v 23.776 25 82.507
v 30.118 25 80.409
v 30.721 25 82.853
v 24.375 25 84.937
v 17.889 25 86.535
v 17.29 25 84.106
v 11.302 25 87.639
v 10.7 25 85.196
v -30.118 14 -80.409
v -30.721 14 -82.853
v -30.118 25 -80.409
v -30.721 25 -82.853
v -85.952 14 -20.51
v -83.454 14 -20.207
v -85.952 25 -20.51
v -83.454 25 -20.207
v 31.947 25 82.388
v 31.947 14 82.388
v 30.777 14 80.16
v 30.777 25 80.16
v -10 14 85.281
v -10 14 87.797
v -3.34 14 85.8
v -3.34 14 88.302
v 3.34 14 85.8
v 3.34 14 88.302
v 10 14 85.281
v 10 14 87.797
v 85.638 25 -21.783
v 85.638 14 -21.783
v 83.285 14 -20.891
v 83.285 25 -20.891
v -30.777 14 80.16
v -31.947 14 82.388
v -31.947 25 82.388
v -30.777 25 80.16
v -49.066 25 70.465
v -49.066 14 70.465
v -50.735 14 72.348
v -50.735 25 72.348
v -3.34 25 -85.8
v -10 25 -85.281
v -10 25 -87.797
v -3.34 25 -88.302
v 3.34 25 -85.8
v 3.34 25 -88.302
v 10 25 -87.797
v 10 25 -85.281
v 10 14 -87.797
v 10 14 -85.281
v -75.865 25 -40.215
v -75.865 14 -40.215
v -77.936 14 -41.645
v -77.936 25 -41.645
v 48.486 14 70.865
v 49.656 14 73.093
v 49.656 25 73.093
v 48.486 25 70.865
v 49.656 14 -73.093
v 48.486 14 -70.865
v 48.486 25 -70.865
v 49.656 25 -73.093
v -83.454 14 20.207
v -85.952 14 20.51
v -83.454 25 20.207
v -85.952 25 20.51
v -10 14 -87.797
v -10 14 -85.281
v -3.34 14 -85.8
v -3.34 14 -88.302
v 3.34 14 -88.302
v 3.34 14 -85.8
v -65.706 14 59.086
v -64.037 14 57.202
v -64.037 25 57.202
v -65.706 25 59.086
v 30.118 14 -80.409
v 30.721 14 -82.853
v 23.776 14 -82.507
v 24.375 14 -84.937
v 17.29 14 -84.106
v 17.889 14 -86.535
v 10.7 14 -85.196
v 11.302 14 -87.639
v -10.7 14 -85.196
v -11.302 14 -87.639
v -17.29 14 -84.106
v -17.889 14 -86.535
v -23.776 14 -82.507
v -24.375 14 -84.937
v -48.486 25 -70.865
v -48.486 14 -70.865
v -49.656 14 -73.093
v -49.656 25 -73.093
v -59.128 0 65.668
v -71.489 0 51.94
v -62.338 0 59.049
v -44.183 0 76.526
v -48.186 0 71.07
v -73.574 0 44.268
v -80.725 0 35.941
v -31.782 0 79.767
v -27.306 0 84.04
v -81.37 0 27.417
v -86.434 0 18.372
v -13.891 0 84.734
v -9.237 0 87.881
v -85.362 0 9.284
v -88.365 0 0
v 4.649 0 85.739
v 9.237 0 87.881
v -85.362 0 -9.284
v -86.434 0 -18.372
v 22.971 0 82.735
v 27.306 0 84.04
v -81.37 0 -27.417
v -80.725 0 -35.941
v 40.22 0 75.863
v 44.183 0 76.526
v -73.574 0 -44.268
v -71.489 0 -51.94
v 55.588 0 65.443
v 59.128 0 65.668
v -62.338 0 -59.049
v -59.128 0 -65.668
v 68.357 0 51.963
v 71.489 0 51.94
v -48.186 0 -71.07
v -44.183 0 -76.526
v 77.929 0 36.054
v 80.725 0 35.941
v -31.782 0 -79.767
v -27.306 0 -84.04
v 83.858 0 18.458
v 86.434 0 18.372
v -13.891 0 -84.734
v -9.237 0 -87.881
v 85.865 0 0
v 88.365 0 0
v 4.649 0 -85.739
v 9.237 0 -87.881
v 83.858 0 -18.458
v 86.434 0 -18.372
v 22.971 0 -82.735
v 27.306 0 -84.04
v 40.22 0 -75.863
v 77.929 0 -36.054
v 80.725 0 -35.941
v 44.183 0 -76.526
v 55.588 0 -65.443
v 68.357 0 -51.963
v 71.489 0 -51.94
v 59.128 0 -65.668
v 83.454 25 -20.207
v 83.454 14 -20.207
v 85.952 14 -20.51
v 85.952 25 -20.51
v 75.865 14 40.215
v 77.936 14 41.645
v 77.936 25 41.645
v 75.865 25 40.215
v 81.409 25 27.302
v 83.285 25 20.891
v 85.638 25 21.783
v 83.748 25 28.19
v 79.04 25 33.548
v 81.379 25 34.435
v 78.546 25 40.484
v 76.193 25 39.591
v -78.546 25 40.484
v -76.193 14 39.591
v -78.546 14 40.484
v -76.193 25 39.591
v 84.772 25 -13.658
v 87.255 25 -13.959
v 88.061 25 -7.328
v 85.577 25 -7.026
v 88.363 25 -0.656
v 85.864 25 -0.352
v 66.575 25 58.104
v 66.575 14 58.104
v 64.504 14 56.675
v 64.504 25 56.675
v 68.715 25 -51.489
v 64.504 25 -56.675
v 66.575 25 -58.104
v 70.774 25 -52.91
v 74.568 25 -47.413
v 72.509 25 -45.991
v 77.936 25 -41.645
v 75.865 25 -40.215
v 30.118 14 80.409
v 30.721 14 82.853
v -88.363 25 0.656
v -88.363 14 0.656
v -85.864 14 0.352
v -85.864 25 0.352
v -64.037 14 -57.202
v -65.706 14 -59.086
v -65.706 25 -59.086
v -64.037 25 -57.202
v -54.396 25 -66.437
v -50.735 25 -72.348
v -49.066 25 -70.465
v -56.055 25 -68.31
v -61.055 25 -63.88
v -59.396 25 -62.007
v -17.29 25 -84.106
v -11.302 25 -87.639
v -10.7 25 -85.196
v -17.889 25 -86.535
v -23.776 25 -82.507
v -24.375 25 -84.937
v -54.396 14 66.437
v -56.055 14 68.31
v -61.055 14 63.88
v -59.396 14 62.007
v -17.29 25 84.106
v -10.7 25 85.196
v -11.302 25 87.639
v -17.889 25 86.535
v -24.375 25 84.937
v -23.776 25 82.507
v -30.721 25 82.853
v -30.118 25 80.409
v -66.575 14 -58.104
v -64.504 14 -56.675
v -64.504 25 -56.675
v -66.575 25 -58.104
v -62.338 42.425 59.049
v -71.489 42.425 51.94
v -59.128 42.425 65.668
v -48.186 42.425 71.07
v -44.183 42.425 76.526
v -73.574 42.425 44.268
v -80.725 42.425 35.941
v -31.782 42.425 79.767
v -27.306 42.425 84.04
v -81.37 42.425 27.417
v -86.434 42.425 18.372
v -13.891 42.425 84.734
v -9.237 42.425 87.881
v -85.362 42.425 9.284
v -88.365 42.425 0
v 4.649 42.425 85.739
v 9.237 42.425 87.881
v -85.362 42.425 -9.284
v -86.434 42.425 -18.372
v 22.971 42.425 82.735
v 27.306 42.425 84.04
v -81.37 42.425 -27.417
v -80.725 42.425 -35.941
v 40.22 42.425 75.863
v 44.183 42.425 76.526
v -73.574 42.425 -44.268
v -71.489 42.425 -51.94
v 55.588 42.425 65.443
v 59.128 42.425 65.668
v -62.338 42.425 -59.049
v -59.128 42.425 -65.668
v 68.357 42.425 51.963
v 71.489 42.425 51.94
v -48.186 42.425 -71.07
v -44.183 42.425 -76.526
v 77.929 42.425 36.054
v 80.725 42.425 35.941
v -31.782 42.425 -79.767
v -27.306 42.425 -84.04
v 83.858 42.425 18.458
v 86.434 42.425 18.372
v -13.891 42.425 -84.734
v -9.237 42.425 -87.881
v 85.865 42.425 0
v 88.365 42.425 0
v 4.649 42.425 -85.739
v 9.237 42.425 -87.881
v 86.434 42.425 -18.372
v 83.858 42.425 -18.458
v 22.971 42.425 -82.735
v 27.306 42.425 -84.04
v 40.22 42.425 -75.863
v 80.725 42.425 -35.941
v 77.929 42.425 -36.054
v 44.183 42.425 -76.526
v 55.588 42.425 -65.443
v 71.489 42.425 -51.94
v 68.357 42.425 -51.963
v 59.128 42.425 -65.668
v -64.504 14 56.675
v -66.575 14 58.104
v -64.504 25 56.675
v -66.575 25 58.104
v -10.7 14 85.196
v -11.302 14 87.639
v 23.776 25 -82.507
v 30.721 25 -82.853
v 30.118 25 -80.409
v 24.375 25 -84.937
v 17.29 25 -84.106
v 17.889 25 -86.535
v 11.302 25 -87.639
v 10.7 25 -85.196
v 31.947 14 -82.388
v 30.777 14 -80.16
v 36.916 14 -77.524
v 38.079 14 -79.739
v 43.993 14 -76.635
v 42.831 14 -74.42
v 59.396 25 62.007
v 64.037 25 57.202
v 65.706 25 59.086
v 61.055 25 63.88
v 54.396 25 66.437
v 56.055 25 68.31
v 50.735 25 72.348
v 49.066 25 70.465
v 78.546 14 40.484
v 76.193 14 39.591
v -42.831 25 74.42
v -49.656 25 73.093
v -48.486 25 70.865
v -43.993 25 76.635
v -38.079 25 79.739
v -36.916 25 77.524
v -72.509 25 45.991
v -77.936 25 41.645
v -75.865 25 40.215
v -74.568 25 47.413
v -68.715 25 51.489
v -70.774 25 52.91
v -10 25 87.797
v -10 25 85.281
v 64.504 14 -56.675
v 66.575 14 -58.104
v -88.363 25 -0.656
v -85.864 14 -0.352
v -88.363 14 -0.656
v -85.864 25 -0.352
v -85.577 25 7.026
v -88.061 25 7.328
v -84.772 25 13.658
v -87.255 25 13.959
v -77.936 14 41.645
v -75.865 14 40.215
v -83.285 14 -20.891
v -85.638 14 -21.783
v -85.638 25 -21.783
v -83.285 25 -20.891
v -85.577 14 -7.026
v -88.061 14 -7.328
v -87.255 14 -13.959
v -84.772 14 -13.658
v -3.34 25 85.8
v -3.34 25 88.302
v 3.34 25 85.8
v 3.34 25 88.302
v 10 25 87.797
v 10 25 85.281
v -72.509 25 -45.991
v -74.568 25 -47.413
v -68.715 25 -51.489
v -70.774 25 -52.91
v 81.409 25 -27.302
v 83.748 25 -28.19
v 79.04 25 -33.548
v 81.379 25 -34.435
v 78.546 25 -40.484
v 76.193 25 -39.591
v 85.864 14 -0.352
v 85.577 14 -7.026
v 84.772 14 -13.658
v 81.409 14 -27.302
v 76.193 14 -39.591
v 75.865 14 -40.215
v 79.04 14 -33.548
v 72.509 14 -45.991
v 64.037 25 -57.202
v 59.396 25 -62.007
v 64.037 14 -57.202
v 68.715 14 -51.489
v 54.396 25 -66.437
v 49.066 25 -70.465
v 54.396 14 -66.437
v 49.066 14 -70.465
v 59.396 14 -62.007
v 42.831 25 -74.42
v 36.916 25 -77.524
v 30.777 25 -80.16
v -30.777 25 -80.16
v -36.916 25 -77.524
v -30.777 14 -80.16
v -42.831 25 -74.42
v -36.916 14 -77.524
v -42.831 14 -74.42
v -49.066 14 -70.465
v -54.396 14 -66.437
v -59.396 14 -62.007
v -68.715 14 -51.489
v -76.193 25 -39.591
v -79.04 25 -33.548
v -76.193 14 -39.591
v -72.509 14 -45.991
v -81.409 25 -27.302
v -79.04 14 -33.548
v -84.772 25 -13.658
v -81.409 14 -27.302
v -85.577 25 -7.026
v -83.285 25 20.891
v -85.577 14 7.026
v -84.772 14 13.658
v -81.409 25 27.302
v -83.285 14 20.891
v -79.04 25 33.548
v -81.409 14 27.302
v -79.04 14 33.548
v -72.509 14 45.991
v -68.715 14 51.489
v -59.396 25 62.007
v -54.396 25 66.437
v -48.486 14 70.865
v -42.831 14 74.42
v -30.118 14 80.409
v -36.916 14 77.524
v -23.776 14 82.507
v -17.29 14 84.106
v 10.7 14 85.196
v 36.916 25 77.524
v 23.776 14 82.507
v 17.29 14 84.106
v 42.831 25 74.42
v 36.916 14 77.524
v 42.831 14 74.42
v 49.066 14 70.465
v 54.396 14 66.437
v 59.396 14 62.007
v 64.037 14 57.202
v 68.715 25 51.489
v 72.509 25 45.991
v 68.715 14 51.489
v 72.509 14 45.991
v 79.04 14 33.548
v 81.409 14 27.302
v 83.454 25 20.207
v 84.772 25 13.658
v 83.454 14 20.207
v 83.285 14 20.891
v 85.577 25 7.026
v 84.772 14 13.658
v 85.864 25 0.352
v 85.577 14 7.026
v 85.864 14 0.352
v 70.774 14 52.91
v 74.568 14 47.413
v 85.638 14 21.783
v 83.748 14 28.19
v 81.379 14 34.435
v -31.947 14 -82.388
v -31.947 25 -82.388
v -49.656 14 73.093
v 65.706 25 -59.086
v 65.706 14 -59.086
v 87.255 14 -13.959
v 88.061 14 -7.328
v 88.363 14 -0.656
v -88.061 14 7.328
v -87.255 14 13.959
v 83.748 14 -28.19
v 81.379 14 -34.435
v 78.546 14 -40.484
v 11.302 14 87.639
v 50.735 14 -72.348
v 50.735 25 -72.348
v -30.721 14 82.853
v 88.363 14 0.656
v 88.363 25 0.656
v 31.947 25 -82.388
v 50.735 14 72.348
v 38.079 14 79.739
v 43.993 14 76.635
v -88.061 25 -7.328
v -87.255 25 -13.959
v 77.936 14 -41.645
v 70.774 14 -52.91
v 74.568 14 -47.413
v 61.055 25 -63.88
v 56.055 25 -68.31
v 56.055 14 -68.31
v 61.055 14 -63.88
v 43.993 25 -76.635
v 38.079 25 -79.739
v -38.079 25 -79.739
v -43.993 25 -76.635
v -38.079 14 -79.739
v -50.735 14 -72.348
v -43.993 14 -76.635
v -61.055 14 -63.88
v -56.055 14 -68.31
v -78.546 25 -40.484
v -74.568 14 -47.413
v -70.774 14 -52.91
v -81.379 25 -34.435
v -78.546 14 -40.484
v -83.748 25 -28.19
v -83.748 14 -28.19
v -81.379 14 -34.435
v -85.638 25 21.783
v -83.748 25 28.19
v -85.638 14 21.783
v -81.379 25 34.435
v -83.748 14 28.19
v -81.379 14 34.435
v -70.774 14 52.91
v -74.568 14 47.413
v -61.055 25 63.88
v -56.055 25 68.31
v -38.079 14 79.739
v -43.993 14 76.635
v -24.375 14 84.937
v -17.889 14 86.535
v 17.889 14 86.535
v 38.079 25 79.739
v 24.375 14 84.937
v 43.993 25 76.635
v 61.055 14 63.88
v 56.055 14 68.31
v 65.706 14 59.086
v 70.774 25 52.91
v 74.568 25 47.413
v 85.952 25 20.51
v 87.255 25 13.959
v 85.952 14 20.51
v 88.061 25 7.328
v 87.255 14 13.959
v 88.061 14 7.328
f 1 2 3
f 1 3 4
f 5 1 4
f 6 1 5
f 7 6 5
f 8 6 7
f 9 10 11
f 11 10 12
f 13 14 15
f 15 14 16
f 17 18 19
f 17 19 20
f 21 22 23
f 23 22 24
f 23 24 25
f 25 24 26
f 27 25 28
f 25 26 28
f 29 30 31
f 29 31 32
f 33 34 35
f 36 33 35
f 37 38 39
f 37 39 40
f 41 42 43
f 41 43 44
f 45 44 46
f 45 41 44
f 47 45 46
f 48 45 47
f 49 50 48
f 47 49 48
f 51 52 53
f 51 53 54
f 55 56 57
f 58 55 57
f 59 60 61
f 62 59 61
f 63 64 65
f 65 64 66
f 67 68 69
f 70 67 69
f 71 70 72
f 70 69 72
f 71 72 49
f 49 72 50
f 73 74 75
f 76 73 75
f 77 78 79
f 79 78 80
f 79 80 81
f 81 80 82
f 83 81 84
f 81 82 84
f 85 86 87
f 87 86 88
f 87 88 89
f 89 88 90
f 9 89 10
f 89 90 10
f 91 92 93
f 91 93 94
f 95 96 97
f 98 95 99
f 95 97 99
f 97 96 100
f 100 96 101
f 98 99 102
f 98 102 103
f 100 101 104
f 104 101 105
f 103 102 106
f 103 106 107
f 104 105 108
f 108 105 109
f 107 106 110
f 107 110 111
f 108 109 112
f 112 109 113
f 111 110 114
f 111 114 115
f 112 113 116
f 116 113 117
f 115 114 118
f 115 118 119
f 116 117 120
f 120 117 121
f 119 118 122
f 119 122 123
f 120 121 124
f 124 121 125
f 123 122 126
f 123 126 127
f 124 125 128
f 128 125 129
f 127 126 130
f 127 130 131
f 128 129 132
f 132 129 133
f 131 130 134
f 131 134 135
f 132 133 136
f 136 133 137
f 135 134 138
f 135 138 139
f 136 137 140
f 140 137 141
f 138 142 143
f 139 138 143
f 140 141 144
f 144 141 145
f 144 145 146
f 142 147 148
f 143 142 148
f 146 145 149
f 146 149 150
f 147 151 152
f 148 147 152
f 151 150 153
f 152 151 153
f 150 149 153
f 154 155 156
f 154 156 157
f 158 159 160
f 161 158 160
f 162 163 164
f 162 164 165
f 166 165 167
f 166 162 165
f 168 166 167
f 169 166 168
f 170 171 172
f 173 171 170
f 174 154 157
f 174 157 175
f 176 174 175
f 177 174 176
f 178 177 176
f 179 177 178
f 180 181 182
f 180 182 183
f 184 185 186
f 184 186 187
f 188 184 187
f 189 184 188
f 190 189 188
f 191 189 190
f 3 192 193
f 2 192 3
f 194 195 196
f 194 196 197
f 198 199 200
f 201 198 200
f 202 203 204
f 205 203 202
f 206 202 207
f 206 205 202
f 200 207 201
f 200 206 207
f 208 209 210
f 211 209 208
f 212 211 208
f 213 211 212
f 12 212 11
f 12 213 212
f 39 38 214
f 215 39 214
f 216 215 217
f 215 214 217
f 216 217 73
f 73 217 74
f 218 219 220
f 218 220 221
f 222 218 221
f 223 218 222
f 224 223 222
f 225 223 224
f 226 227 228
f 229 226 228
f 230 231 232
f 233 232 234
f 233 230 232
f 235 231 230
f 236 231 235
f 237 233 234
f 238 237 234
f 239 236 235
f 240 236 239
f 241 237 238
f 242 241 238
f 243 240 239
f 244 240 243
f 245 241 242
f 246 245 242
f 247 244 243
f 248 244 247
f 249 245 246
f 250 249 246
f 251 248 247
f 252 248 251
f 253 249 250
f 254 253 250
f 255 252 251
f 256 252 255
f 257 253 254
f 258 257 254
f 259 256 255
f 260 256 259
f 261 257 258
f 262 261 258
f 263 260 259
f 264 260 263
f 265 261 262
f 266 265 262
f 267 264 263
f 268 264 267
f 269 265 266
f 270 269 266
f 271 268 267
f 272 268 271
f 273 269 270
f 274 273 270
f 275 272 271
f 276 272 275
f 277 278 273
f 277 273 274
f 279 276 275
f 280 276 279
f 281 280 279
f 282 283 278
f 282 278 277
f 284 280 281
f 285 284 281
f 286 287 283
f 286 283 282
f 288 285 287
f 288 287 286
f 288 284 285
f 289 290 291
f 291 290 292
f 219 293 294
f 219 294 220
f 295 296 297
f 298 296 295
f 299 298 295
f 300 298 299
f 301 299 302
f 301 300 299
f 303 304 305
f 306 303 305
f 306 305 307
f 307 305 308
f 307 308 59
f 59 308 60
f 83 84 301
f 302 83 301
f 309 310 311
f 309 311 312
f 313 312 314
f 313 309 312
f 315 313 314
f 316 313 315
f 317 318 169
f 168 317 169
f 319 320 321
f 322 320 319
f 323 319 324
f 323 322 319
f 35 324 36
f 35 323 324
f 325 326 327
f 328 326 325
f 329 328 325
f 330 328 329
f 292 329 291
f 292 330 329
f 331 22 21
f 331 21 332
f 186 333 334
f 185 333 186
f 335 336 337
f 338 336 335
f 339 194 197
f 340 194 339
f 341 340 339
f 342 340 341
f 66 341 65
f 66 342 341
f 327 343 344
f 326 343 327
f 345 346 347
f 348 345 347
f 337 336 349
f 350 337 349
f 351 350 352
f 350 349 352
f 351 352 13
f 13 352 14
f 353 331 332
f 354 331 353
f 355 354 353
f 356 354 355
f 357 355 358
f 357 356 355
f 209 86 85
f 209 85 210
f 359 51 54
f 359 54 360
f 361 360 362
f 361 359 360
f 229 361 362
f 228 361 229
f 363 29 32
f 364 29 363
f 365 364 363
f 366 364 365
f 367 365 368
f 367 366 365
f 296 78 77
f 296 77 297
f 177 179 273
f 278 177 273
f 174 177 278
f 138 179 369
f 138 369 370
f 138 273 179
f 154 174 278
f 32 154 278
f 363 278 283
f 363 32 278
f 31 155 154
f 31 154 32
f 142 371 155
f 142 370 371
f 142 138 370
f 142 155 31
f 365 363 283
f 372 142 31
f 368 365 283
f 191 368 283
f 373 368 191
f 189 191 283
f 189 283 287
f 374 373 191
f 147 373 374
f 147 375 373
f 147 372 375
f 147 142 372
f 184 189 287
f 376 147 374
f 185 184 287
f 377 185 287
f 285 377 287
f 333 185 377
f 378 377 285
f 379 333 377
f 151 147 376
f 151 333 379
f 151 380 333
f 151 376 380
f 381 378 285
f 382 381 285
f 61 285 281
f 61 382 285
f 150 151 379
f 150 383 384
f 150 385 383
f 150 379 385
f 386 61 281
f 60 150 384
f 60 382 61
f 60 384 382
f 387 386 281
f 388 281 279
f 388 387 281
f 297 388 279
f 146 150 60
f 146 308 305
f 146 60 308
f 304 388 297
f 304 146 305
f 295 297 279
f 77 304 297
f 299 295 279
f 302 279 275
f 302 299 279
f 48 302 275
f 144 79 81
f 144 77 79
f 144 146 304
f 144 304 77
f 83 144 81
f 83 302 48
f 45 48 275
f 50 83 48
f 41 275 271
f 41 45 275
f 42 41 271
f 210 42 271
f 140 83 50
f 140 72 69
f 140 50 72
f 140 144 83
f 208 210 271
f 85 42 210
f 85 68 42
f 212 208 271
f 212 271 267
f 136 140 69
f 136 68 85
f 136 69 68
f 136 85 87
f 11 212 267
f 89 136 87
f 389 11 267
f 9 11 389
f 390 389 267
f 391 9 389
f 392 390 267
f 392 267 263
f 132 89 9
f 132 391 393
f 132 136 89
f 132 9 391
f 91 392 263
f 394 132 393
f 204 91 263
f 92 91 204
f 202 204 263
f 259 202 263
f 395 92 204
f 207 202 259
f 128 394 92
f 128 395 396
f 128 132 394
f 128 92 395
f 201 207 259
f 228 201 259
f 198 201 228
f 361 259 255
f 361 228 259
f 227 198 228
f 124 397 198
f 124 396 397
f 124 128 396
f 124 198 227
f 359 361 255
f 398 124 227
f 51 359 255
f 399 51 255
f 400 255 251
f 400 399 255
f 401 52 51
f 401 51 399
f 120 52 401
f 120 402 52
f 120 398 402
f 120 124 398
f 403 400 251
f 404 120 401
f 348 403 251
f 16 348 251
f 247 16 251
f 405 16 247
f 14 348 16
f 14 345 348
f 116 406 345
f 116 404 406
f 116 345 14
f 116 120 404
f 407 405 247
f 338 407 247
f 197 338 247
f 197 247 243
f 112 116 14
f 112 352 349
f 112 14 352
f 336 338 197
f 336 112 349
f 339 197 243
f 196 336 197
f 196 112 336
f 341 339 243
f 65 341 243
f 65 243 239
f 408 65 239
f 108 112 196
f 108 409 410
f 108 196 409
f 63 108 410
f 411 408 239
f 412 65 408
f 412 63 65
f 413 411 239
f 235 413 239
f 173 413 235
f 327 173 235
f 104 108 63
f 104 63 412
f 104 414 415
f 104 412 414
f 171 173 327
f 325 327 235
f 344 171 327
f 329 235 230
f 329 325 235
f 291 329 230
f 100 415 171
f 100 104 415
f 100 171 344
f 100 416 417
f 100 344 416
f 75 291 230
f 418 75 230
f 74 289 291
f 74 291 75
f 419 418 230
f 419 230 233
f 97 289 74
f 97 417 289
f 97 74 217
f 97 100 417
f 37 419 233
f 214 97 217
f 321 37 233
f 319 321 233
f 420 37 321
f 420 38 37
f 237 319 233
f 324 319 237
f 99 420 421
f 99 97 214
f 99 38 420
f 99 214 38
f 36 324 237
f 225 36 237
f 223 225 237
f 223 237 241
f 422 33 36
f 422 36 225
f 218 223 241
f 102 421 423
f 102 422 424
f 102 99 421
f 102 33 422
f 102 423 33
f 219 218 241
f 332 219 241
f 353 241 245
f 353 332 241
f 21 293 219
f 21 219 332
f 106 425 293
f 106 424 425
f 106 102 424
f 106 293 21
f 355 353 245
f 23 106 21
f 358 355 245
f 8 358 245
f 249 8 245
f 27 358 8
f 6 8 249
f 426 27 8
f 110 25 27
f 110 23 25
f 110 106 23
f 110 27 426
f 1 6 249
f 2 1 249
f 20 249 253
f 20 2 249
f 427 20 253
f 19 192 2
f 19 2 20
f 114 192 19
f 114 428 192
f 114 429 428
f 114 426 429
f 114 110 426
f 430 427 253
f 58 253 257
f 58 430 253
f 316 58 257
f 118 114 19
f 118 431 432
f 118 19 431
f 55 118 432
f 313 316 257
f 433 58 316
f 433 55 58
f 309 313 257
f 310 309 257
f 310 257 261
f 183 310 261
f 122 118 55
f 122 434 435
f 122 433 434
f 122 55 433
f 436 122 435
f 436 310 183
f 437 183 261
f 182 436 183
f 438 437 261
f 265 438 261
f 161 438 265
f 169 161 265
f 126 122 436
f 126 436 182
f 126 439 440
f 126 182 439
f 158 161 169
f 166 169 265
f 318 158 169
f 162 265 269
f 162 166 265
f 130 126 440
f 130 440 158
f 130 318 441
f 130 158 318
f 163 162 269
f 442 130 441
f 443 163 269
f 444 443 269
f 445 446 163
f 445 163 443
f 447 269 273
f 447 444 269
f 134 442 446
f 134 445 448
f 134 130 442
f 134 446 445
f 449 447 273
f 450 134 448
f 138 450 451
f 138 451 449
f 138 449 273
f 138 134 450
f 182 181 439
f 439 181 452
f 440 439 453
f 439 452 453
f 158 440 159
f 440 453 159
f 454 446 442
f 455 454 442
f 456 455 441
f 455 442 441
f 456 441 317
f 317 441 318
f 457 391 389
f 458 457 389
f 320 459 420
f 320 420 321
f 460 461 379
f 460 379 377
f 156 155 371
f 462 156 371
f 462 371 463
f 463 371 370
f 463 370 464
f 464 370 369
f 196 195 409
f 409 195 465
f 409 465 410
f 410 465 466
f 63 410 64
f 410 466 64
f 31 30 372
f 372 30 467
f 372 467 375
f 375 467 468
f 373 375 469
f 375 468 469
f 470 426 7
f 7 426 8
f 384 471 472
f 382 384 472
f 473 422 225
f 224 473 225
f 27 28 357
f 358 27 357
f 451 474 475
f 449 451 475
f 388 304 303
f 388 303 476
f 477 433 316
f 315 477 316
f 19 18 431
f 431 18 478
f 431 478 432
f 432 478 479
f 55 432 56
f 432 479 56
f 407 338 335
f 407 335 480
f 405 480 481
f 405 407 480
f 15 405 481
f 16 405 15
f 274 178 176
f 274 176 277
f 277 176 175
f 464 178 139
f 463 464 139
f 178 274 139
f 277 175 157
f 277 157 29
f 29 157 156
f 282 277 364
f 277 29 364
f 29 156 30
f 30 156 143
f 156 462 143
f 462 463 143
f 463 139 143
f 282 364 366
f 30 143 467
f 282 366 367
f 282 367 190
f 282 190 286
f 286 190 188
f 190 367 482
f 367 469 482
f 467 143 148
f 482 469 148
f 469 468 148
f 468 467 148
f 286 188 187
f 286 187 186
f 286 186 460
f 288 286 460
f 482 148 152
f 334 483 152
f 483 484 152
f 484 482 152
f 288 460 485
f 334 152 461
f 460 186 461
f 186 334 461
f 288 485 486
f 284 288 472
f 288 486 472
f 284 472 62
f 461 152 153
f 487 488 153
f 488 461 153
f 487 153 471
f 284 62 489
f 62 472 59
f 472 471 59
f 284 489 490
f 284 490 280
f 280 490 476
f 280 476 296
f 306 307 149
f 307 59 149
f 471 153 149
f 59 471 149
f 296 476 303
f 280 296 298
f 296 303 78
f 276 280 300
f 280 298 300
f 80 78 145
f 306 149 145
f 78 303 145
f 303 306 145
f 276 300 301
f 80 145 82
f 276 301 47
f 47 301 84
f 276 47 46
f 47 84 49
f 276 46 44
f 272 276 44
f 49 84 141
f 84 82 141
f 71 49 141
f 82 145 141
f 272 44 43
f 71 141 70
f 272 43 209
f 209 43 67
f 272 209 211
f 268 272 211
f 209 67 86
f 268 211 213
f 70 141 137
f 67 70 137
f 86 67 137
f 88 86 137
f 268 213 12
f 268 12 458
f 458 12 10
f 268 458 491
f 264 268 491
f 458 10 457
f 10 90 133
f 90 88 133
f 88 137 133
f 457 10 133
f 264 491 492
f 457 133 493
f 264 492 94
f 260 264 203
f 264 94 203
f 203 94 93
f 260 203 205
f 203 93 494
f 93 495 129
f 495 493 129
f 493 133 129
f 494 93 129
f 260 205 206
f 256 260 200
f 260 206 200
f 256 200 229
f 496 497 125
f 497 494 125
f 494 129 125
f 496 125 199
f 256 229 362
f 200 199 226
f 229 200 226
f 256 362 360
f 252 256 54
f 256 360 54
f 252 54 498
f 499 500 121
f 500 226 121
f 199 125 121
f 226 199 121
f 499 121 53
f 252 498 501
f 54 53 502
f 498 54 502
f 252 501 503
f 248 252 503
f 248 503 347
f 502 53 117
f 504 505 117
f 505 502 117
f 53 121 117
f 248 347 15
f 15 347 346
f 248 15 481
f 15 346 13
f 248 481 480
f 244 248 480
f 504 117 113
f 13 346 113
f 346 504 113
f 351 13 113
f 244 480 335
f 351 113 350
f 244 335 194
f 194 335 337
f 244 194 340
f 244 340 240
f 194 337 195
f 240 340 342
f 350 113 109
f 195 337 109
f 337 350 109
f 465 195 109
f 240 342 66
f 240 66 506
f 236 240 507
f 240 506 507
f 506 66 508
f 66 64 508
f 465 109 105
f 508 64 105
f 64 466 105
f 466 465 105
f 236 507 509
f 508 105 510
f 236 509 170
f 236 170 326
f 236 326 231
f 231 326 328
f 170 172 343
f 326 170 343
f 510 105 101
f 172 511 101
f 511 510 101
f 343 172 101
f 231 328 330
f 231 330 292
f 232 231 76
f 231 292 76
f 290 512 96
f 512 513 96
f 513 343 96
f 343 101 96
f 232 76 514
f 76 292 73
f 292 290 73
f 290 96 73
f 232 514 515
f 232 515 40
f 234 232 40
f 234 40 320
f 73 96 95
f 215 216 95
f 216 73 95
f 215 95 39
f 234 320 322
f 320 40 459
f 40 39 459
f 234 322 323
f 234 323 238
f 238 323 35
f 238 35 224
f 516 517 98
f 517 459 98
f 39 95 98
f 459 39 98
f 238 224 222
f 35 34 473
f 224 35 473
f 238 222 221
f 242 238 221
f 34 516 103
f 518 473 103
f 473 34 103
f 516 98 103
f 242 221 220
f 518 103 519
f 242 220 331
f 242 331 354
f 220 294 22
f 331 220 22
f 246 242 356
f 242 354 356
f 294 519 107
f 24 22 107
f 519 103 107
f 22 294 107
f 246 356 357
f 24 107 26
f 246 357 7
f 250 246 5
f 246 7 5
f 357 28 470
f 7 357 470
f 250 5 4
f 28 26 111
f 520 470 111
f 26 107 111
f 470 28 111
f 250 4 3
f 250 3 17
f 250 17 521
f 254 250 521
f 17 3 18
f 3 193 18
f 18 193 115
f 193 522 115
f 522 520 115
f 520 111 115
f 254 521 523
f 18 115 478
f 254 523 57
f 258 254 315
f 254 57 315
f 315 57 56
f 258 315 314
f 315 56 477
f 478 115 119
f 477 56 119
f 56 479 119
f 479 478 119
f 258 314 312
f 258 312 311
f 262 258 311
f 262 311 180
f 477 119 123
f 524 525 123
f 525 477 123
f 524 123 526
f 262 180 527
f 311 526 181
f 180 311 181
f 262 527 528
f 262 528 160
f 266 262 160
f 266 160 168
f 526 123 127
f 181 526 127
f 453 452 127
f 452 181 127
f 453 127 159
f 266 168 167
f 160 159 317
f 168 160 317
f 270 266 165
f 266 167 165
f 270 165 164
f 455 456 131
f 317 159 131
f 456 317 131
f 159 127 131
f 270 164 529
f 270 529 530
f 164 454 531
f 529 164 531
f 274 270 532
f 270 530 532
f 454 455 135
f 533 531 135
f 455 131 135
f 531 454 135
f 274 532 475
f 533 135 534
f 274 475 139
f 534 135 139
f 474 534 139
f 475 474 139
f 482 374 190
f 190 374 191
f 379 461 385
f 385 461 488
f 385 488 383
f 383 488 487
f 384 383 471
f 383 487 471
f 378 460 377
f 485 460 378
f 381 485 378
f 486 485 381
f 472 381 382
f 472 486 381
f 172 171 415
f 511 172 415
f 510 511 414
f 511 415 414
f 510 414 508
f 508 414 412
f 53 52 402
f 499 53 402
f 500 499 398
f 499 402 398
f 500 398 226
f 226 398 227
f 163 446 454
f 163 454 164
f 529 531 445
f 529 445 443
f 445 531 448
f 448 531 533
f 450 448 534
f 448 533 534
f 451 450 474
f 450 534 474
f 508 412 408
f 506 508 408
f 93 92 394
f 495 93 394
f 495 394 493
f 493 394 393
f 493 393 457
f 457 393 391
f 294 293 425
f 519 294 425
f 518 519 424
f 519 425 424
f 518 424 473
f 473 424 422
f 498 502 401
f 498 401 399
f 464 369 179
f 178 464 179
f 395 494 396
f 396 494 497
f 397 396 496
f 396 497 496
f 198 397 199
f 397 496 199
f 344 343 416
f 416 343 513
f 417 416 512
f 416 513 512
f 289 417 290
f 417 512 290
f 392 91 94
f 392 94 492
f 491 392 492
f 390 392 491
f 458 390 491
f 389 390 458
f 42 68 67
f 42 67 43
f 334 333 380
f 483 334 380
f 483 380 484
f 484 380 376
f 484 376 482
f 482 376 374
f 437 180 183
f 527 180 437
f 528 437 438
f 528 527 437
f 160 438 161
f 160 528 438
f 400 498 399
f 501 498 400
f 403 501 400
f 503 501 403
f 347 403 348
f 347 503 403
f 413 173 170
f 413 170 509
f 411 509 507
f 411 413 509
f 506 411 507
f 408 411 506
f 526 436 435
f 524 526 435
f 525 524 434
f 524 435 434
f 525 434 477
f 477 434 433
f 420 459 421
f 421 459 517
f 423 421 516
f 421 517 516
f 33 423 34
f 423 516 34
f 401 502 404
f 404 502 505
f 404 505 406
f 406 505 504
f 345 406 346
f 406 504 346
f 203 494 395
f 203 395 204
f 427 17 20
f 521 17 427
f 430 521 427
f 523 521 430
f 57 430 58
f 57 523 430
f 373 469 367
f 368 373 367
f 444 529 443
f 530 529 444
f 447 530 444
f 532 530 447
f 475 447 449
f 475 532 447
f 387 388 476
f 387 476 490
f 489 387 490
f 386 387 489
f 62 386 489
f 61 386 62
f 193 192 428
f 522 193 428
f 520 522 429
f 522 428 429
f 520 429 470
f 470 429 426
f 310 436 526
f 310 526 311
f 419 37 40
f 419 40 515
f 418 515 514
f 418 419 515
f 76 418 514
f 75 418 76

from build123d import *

# Parameters (mm, degrees)
SKETCH1_R           = 88.365
SKETCH1_R_2         = 85.865
BOSS_EXTRUDE1_DEPTH = 42.425
SKETCH2_W           = 20
SKETCH2_H           = 11
CUT_EXTRUDE1_DEPTH  = 89.365
CIRPATTERN1_COUNT   = 13


with BuildPart() as part:
    # Sketch1 → Boss-Extrude1 (new body)
    with BuildSketch(Plane(origin=(0, 0, 0), x_dir=(1, 0, 0), z_dir=(0, 1, 0))):
        Circle(SKETCH1_R)
        Circle(SKETCH1_R_2, mode=Mode.SUBTRACT)
    extrude(amount=BOSS_EXTRUDE1_DEPTH)

    # Sketch2 → Cut-Extrude1 (cut, symmetric)
    with BuildSketch(Plane.XY):
        with Locations((0, 19.5)):
            Rectangle(SKETCH2_W, SKETCH2_H)
    cut_extrude1 = extrude(amount=CUT_EXTRUDE1_DEPTH, both=True, mode=Mode.SUBTRACT)

    # CirPattern1: Cut-Extrude1 ×13 about axis
    cirpattern1_axis = Axis((0, 0, 0), (0, 1, 0))
    for i in range(1, CIRPATTERN1_COUNT):
        add(cut_extrude1.rotate(cirpattern1_axis, i * 360 / CIRPATTERN1_COUNT), mode=Mode.SUBTRACT)


solid = part.part
